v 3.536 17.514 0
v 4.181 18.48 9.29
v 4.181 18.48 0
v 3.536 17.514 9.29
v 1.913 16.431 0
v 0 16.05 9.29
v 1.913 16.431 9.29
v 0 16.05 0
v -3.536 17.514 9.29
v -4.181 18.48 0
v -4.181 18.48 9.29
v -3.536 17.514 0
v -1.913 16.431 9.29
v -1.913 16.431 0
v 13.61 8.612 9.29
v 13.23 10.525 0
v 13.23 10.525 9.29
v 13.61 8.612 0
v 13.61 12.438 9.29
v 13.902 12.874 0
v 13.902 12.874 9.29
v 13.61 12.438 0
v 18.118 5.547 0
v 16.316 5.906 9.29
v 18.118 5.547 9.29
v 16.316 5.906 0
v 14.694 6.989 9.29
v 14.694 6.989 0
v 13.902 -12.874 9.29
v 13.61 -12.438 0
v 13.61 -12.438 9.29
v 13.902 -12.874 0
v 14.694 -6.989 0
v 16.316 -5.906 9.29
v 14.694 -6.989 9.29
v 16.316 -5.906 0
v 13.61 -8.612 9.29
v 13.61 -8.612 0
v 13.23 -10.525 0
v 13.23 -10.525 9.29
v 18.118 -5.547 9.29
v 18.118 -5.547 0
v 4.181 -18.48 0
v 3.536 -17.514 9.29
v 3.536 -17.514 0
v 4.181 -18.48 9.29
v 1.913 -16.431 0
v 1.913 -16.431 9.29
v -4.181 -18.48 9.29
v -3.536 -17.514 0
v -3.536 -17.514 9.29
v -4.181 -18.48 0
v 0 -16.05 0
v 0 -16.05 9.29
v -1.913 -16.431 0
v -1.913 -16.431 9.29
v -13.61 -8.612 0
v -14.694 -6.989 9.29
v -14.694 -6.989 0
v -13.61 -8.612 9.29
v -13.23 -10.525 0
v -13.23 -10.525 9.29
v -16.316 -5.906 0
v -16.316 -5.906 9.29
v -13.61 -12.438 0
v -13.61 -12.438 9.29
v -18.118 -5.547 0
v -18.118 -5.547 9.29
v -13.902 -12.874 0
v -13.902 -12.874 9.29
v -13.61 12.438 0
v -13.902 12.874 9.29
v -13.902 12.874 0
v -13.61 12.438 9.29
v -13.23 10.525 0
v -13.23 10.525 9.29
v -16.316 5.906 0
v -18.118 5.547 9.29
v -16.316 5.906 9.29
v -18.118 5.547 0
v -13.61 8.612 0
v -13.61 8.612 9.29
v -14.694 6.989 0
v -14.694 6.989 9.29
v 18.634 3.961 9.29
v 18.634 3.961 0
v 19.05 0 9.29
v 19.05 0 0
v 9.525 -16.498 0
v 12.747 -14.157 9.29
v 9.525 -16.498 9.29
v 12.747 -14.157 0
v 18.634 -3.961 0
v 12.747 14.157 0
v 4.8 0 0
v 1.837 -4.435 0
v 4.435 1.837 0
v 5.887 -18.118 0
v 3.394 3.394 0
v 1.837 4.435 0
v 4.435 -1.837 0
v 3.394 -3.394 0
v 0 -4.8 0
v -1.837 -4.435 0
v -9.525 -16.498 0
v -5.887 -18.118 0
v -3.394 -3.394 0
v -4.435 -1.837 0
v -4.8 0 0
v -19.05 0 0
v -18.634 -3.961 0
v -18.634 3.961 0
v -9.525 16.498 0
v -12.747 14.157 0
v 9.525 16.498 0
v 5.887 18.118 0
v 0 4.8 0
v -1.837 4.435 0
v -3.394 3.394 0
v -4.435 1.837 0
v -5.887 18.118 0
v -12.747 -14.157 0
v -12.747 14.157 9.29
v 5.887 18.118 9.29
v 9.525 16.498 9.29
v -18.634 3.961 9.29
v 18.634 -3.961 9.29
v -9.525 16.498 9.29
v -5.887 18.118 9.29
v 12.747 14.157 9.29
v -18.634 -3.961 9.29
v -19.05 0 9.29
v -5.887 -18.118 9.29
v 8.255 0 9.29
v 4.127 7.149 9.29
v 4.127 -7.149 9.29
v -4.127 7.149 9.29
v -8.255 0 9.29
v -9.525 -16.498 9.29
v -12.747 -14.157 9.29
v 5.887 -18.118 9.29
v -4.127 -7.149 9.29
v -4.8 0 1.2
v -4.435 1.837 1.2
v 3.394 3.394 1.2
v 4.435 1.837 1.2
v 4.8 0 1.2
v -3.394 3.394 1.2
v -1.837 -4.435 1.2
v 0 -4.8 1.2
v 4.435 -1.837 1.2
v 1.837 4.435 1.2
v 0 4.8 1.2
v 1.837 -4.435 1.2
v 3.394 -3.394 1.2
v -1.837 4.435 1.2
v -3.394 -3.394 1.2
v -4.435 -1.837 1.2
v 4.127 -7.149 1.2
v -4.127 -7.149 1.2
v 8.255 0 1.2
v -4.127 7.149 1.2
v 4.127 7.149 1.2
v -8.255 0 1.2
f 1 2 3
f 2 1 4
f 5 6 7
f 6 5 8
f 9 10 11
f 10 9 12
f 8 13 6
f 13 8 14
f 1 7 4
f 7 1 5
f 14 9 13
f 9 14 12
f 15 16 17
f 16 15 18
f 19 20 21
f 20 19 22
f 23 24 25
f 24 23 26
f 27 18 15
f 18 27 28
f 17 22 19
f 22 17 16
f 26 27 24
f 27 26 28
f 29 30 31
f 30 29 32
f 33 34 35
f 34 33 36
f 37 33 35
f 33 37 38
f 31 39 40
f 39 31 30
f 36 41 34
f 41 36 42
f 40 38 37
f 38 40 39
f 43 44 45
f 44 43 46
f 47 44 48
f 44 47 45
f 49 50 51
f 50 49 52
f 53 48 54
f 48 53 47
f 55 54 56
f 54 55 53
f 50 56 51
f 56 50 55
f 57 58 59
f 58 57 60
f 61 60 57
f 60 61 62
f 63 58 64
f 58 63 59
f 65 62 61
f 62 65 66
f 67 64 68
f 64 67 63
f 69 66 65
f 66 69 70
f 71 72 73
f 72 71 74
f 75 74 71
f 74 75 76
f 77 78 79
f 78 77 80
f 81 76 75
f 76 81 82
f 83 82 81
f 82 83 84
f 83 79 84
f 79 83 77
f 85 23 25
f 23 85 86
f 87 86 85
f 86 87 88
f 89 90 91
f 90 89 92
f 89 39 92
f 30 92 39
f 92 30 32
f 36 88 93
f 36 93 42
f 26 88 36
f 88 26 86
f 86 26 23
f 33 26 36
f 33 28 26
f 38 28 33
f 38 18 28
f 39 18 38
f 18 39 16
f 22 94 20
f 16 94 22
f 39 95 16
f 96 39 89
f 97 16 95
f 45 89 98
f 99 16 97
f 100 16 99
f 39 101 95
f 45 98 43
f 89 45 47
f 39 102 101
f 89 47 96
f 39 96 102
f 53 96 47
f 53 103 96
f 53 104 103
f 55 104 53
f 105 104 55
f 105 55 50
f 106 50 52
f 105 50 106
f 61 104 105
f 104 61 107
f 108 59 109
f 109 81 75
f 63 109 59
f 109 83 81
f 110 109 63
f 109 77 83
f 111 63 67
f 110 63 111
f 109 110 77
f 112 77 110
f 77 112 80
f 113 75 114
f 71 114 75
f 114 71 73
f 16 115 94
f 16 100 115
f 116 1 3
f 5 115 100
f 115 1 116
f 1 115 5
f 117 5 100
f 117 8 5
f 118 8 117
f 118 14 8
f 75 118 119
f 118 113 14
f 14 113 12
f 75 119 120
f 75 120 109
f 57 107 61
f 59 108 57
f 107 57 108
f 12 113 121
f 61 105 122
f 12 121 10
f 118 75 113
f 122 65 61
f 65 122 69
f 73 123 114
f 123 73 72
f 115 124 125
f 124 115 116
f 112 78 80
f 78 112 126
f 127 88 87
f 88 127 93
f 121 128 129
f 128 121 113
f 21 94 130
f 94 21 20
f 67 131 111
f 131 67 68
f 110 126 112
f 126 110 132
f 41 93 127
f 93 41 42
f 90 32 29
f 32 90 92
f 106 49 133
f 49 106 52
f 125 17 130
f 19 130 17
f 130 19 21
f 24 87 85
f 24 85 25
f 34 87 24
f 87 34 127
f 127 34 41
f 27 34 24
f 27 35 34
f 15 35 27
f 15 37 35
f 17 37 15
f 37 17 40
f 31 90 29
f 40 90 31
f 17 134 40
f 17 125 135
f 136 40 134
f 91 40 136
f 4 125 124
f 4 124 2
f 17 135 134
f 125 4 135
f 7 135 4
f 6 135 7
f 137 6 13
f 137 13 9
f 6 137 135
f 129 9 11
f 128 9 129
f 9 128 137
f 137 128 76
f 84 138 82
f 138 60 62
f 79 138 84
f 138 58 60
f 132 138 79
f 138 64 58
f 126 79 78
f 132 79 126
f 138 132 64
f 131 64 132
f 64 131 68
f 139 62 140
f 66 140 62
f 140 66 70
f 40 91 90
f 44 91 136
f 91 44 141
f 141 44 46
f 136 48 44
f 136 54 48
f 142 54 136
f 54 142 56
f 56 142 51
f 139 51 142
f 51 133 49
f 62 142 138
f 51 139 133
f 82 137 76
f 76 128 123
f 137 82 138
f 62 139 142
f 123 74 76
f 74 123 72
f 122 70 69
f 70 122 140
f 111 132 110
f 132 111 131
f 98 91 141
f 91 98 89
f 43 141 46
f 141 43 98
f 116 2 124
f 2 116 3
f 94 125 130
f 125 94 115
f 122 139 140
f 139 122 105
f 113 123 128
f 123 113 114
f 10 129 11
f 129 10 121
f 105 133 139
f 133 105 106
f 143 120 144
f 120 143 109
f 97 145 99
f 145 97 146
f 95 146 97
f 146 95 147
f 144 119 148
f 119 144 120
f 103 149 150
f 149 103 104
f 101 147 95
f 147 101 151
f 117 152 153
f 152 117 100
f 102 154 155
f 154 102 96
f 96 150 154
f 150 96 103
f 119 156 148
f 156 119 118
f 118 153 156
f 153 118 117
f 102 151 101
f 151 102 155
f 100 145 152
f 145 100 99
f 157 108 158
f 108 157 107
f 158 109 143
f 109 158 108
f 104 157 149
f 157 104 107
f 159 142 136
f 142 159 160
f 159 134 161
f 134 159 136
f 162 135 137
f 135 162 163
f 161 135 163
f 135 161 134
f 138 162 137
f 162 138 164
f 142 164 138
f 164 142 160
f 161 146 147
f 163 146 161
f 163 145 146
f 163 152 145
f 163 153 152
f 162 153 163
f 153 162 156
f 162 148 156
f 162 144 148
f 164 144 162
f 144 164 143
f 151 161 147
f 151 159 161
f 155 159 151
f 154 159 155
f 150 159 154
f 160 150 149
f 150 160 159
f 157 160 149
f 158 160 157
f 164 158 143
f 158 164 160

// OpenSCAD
// [FL_INDEX: keywords="openscad, 3d_parametric, Parametric_knob_for_attaching_camera_to__14_Steadicam, csg_solid" | COT="Parametric OpenSCAD design from 3DCodeverse"]
// Title: Parametric knob for attaching camera to $14 Steadicam

// ===== file: knob_one_quarter_inch.scad =====
/*

Parametric knob generator
by Gian Pablo Villamil
May 2011

Makes knurled knobs that accomodate a nut in the middle, useful for things
like camera mounts.

*/

knob_radius = 16;
dent_radius = 5;
knob_height = 6.73;
num_dents = 6;
dent_offset = 2;

nut_hole_radius = 3.175; // half of 1/4 inch in millimeters
nut_size_radius = 6.2; // point to point size of nut

module knob()
{
	translate([0, 0, 0]) {
		difference() {
		cylinder(h = knob_height, r = knob_radius);
		for (i = [0:(num_dents - 1)]) {
			translate([sin(360*i/num_dents)*(knob_radius+dent_offset), cos(360*i/num_dents)*(knob_radius+dent_offset), -5 ])
			cylinder(h = knob_height+10, r=dent_radius);
			}
		translate([0,0,-5]) cylinder(h = knob_height+10, r=nut_hole_radius,$fa=10);
		translate([0,0,1.2]) cylinder(h = knob_height+10, r=nut_size_radius,$fa=60);
		}
	}
}

knob();

// ===== file: knob_three-eighths_inch.scad =====
/*

Parametric knob generator
by Gian Pablo Villamil
May 2011

Makes knurled knobs that accomodate a nut in the middle, useful for things
like camera mounts.

version for 3/8 inch nut

*/

knob_radius = 19.05;
dent_radius = 5;
knob_height = 9.29;
num_dents = 6;
dent_offset = 2;

nut_hole_radius = 4.8; // half of 1/4 inch in millimeters
nut_size_radius = 8.255; // point to point size of nut

module knob()
{
	translate([0, 0, 0]) {
		difference() {
		cylinder(h = knob_height, r = knob_radius);
		for (i = [0:(num_dents - 1)]) {
			translate([sin(360*i/num_dents)*(knob_radius+dent_offset), cos(360*i/num_dents)*(knob_radius+dent_offset), -5 ])
			cylinder(h = knob_height+10, r=dent_radius);
			}
		translate([0,0,-5]) cylinder(h = knob_height+10, r=nut_hole_radius,$fa=10);
		translate([0,0,1.2]) cylinder(h = knob_height+10, r=nut_size_radius,$fa=60);
		}
	}
}

knob();
